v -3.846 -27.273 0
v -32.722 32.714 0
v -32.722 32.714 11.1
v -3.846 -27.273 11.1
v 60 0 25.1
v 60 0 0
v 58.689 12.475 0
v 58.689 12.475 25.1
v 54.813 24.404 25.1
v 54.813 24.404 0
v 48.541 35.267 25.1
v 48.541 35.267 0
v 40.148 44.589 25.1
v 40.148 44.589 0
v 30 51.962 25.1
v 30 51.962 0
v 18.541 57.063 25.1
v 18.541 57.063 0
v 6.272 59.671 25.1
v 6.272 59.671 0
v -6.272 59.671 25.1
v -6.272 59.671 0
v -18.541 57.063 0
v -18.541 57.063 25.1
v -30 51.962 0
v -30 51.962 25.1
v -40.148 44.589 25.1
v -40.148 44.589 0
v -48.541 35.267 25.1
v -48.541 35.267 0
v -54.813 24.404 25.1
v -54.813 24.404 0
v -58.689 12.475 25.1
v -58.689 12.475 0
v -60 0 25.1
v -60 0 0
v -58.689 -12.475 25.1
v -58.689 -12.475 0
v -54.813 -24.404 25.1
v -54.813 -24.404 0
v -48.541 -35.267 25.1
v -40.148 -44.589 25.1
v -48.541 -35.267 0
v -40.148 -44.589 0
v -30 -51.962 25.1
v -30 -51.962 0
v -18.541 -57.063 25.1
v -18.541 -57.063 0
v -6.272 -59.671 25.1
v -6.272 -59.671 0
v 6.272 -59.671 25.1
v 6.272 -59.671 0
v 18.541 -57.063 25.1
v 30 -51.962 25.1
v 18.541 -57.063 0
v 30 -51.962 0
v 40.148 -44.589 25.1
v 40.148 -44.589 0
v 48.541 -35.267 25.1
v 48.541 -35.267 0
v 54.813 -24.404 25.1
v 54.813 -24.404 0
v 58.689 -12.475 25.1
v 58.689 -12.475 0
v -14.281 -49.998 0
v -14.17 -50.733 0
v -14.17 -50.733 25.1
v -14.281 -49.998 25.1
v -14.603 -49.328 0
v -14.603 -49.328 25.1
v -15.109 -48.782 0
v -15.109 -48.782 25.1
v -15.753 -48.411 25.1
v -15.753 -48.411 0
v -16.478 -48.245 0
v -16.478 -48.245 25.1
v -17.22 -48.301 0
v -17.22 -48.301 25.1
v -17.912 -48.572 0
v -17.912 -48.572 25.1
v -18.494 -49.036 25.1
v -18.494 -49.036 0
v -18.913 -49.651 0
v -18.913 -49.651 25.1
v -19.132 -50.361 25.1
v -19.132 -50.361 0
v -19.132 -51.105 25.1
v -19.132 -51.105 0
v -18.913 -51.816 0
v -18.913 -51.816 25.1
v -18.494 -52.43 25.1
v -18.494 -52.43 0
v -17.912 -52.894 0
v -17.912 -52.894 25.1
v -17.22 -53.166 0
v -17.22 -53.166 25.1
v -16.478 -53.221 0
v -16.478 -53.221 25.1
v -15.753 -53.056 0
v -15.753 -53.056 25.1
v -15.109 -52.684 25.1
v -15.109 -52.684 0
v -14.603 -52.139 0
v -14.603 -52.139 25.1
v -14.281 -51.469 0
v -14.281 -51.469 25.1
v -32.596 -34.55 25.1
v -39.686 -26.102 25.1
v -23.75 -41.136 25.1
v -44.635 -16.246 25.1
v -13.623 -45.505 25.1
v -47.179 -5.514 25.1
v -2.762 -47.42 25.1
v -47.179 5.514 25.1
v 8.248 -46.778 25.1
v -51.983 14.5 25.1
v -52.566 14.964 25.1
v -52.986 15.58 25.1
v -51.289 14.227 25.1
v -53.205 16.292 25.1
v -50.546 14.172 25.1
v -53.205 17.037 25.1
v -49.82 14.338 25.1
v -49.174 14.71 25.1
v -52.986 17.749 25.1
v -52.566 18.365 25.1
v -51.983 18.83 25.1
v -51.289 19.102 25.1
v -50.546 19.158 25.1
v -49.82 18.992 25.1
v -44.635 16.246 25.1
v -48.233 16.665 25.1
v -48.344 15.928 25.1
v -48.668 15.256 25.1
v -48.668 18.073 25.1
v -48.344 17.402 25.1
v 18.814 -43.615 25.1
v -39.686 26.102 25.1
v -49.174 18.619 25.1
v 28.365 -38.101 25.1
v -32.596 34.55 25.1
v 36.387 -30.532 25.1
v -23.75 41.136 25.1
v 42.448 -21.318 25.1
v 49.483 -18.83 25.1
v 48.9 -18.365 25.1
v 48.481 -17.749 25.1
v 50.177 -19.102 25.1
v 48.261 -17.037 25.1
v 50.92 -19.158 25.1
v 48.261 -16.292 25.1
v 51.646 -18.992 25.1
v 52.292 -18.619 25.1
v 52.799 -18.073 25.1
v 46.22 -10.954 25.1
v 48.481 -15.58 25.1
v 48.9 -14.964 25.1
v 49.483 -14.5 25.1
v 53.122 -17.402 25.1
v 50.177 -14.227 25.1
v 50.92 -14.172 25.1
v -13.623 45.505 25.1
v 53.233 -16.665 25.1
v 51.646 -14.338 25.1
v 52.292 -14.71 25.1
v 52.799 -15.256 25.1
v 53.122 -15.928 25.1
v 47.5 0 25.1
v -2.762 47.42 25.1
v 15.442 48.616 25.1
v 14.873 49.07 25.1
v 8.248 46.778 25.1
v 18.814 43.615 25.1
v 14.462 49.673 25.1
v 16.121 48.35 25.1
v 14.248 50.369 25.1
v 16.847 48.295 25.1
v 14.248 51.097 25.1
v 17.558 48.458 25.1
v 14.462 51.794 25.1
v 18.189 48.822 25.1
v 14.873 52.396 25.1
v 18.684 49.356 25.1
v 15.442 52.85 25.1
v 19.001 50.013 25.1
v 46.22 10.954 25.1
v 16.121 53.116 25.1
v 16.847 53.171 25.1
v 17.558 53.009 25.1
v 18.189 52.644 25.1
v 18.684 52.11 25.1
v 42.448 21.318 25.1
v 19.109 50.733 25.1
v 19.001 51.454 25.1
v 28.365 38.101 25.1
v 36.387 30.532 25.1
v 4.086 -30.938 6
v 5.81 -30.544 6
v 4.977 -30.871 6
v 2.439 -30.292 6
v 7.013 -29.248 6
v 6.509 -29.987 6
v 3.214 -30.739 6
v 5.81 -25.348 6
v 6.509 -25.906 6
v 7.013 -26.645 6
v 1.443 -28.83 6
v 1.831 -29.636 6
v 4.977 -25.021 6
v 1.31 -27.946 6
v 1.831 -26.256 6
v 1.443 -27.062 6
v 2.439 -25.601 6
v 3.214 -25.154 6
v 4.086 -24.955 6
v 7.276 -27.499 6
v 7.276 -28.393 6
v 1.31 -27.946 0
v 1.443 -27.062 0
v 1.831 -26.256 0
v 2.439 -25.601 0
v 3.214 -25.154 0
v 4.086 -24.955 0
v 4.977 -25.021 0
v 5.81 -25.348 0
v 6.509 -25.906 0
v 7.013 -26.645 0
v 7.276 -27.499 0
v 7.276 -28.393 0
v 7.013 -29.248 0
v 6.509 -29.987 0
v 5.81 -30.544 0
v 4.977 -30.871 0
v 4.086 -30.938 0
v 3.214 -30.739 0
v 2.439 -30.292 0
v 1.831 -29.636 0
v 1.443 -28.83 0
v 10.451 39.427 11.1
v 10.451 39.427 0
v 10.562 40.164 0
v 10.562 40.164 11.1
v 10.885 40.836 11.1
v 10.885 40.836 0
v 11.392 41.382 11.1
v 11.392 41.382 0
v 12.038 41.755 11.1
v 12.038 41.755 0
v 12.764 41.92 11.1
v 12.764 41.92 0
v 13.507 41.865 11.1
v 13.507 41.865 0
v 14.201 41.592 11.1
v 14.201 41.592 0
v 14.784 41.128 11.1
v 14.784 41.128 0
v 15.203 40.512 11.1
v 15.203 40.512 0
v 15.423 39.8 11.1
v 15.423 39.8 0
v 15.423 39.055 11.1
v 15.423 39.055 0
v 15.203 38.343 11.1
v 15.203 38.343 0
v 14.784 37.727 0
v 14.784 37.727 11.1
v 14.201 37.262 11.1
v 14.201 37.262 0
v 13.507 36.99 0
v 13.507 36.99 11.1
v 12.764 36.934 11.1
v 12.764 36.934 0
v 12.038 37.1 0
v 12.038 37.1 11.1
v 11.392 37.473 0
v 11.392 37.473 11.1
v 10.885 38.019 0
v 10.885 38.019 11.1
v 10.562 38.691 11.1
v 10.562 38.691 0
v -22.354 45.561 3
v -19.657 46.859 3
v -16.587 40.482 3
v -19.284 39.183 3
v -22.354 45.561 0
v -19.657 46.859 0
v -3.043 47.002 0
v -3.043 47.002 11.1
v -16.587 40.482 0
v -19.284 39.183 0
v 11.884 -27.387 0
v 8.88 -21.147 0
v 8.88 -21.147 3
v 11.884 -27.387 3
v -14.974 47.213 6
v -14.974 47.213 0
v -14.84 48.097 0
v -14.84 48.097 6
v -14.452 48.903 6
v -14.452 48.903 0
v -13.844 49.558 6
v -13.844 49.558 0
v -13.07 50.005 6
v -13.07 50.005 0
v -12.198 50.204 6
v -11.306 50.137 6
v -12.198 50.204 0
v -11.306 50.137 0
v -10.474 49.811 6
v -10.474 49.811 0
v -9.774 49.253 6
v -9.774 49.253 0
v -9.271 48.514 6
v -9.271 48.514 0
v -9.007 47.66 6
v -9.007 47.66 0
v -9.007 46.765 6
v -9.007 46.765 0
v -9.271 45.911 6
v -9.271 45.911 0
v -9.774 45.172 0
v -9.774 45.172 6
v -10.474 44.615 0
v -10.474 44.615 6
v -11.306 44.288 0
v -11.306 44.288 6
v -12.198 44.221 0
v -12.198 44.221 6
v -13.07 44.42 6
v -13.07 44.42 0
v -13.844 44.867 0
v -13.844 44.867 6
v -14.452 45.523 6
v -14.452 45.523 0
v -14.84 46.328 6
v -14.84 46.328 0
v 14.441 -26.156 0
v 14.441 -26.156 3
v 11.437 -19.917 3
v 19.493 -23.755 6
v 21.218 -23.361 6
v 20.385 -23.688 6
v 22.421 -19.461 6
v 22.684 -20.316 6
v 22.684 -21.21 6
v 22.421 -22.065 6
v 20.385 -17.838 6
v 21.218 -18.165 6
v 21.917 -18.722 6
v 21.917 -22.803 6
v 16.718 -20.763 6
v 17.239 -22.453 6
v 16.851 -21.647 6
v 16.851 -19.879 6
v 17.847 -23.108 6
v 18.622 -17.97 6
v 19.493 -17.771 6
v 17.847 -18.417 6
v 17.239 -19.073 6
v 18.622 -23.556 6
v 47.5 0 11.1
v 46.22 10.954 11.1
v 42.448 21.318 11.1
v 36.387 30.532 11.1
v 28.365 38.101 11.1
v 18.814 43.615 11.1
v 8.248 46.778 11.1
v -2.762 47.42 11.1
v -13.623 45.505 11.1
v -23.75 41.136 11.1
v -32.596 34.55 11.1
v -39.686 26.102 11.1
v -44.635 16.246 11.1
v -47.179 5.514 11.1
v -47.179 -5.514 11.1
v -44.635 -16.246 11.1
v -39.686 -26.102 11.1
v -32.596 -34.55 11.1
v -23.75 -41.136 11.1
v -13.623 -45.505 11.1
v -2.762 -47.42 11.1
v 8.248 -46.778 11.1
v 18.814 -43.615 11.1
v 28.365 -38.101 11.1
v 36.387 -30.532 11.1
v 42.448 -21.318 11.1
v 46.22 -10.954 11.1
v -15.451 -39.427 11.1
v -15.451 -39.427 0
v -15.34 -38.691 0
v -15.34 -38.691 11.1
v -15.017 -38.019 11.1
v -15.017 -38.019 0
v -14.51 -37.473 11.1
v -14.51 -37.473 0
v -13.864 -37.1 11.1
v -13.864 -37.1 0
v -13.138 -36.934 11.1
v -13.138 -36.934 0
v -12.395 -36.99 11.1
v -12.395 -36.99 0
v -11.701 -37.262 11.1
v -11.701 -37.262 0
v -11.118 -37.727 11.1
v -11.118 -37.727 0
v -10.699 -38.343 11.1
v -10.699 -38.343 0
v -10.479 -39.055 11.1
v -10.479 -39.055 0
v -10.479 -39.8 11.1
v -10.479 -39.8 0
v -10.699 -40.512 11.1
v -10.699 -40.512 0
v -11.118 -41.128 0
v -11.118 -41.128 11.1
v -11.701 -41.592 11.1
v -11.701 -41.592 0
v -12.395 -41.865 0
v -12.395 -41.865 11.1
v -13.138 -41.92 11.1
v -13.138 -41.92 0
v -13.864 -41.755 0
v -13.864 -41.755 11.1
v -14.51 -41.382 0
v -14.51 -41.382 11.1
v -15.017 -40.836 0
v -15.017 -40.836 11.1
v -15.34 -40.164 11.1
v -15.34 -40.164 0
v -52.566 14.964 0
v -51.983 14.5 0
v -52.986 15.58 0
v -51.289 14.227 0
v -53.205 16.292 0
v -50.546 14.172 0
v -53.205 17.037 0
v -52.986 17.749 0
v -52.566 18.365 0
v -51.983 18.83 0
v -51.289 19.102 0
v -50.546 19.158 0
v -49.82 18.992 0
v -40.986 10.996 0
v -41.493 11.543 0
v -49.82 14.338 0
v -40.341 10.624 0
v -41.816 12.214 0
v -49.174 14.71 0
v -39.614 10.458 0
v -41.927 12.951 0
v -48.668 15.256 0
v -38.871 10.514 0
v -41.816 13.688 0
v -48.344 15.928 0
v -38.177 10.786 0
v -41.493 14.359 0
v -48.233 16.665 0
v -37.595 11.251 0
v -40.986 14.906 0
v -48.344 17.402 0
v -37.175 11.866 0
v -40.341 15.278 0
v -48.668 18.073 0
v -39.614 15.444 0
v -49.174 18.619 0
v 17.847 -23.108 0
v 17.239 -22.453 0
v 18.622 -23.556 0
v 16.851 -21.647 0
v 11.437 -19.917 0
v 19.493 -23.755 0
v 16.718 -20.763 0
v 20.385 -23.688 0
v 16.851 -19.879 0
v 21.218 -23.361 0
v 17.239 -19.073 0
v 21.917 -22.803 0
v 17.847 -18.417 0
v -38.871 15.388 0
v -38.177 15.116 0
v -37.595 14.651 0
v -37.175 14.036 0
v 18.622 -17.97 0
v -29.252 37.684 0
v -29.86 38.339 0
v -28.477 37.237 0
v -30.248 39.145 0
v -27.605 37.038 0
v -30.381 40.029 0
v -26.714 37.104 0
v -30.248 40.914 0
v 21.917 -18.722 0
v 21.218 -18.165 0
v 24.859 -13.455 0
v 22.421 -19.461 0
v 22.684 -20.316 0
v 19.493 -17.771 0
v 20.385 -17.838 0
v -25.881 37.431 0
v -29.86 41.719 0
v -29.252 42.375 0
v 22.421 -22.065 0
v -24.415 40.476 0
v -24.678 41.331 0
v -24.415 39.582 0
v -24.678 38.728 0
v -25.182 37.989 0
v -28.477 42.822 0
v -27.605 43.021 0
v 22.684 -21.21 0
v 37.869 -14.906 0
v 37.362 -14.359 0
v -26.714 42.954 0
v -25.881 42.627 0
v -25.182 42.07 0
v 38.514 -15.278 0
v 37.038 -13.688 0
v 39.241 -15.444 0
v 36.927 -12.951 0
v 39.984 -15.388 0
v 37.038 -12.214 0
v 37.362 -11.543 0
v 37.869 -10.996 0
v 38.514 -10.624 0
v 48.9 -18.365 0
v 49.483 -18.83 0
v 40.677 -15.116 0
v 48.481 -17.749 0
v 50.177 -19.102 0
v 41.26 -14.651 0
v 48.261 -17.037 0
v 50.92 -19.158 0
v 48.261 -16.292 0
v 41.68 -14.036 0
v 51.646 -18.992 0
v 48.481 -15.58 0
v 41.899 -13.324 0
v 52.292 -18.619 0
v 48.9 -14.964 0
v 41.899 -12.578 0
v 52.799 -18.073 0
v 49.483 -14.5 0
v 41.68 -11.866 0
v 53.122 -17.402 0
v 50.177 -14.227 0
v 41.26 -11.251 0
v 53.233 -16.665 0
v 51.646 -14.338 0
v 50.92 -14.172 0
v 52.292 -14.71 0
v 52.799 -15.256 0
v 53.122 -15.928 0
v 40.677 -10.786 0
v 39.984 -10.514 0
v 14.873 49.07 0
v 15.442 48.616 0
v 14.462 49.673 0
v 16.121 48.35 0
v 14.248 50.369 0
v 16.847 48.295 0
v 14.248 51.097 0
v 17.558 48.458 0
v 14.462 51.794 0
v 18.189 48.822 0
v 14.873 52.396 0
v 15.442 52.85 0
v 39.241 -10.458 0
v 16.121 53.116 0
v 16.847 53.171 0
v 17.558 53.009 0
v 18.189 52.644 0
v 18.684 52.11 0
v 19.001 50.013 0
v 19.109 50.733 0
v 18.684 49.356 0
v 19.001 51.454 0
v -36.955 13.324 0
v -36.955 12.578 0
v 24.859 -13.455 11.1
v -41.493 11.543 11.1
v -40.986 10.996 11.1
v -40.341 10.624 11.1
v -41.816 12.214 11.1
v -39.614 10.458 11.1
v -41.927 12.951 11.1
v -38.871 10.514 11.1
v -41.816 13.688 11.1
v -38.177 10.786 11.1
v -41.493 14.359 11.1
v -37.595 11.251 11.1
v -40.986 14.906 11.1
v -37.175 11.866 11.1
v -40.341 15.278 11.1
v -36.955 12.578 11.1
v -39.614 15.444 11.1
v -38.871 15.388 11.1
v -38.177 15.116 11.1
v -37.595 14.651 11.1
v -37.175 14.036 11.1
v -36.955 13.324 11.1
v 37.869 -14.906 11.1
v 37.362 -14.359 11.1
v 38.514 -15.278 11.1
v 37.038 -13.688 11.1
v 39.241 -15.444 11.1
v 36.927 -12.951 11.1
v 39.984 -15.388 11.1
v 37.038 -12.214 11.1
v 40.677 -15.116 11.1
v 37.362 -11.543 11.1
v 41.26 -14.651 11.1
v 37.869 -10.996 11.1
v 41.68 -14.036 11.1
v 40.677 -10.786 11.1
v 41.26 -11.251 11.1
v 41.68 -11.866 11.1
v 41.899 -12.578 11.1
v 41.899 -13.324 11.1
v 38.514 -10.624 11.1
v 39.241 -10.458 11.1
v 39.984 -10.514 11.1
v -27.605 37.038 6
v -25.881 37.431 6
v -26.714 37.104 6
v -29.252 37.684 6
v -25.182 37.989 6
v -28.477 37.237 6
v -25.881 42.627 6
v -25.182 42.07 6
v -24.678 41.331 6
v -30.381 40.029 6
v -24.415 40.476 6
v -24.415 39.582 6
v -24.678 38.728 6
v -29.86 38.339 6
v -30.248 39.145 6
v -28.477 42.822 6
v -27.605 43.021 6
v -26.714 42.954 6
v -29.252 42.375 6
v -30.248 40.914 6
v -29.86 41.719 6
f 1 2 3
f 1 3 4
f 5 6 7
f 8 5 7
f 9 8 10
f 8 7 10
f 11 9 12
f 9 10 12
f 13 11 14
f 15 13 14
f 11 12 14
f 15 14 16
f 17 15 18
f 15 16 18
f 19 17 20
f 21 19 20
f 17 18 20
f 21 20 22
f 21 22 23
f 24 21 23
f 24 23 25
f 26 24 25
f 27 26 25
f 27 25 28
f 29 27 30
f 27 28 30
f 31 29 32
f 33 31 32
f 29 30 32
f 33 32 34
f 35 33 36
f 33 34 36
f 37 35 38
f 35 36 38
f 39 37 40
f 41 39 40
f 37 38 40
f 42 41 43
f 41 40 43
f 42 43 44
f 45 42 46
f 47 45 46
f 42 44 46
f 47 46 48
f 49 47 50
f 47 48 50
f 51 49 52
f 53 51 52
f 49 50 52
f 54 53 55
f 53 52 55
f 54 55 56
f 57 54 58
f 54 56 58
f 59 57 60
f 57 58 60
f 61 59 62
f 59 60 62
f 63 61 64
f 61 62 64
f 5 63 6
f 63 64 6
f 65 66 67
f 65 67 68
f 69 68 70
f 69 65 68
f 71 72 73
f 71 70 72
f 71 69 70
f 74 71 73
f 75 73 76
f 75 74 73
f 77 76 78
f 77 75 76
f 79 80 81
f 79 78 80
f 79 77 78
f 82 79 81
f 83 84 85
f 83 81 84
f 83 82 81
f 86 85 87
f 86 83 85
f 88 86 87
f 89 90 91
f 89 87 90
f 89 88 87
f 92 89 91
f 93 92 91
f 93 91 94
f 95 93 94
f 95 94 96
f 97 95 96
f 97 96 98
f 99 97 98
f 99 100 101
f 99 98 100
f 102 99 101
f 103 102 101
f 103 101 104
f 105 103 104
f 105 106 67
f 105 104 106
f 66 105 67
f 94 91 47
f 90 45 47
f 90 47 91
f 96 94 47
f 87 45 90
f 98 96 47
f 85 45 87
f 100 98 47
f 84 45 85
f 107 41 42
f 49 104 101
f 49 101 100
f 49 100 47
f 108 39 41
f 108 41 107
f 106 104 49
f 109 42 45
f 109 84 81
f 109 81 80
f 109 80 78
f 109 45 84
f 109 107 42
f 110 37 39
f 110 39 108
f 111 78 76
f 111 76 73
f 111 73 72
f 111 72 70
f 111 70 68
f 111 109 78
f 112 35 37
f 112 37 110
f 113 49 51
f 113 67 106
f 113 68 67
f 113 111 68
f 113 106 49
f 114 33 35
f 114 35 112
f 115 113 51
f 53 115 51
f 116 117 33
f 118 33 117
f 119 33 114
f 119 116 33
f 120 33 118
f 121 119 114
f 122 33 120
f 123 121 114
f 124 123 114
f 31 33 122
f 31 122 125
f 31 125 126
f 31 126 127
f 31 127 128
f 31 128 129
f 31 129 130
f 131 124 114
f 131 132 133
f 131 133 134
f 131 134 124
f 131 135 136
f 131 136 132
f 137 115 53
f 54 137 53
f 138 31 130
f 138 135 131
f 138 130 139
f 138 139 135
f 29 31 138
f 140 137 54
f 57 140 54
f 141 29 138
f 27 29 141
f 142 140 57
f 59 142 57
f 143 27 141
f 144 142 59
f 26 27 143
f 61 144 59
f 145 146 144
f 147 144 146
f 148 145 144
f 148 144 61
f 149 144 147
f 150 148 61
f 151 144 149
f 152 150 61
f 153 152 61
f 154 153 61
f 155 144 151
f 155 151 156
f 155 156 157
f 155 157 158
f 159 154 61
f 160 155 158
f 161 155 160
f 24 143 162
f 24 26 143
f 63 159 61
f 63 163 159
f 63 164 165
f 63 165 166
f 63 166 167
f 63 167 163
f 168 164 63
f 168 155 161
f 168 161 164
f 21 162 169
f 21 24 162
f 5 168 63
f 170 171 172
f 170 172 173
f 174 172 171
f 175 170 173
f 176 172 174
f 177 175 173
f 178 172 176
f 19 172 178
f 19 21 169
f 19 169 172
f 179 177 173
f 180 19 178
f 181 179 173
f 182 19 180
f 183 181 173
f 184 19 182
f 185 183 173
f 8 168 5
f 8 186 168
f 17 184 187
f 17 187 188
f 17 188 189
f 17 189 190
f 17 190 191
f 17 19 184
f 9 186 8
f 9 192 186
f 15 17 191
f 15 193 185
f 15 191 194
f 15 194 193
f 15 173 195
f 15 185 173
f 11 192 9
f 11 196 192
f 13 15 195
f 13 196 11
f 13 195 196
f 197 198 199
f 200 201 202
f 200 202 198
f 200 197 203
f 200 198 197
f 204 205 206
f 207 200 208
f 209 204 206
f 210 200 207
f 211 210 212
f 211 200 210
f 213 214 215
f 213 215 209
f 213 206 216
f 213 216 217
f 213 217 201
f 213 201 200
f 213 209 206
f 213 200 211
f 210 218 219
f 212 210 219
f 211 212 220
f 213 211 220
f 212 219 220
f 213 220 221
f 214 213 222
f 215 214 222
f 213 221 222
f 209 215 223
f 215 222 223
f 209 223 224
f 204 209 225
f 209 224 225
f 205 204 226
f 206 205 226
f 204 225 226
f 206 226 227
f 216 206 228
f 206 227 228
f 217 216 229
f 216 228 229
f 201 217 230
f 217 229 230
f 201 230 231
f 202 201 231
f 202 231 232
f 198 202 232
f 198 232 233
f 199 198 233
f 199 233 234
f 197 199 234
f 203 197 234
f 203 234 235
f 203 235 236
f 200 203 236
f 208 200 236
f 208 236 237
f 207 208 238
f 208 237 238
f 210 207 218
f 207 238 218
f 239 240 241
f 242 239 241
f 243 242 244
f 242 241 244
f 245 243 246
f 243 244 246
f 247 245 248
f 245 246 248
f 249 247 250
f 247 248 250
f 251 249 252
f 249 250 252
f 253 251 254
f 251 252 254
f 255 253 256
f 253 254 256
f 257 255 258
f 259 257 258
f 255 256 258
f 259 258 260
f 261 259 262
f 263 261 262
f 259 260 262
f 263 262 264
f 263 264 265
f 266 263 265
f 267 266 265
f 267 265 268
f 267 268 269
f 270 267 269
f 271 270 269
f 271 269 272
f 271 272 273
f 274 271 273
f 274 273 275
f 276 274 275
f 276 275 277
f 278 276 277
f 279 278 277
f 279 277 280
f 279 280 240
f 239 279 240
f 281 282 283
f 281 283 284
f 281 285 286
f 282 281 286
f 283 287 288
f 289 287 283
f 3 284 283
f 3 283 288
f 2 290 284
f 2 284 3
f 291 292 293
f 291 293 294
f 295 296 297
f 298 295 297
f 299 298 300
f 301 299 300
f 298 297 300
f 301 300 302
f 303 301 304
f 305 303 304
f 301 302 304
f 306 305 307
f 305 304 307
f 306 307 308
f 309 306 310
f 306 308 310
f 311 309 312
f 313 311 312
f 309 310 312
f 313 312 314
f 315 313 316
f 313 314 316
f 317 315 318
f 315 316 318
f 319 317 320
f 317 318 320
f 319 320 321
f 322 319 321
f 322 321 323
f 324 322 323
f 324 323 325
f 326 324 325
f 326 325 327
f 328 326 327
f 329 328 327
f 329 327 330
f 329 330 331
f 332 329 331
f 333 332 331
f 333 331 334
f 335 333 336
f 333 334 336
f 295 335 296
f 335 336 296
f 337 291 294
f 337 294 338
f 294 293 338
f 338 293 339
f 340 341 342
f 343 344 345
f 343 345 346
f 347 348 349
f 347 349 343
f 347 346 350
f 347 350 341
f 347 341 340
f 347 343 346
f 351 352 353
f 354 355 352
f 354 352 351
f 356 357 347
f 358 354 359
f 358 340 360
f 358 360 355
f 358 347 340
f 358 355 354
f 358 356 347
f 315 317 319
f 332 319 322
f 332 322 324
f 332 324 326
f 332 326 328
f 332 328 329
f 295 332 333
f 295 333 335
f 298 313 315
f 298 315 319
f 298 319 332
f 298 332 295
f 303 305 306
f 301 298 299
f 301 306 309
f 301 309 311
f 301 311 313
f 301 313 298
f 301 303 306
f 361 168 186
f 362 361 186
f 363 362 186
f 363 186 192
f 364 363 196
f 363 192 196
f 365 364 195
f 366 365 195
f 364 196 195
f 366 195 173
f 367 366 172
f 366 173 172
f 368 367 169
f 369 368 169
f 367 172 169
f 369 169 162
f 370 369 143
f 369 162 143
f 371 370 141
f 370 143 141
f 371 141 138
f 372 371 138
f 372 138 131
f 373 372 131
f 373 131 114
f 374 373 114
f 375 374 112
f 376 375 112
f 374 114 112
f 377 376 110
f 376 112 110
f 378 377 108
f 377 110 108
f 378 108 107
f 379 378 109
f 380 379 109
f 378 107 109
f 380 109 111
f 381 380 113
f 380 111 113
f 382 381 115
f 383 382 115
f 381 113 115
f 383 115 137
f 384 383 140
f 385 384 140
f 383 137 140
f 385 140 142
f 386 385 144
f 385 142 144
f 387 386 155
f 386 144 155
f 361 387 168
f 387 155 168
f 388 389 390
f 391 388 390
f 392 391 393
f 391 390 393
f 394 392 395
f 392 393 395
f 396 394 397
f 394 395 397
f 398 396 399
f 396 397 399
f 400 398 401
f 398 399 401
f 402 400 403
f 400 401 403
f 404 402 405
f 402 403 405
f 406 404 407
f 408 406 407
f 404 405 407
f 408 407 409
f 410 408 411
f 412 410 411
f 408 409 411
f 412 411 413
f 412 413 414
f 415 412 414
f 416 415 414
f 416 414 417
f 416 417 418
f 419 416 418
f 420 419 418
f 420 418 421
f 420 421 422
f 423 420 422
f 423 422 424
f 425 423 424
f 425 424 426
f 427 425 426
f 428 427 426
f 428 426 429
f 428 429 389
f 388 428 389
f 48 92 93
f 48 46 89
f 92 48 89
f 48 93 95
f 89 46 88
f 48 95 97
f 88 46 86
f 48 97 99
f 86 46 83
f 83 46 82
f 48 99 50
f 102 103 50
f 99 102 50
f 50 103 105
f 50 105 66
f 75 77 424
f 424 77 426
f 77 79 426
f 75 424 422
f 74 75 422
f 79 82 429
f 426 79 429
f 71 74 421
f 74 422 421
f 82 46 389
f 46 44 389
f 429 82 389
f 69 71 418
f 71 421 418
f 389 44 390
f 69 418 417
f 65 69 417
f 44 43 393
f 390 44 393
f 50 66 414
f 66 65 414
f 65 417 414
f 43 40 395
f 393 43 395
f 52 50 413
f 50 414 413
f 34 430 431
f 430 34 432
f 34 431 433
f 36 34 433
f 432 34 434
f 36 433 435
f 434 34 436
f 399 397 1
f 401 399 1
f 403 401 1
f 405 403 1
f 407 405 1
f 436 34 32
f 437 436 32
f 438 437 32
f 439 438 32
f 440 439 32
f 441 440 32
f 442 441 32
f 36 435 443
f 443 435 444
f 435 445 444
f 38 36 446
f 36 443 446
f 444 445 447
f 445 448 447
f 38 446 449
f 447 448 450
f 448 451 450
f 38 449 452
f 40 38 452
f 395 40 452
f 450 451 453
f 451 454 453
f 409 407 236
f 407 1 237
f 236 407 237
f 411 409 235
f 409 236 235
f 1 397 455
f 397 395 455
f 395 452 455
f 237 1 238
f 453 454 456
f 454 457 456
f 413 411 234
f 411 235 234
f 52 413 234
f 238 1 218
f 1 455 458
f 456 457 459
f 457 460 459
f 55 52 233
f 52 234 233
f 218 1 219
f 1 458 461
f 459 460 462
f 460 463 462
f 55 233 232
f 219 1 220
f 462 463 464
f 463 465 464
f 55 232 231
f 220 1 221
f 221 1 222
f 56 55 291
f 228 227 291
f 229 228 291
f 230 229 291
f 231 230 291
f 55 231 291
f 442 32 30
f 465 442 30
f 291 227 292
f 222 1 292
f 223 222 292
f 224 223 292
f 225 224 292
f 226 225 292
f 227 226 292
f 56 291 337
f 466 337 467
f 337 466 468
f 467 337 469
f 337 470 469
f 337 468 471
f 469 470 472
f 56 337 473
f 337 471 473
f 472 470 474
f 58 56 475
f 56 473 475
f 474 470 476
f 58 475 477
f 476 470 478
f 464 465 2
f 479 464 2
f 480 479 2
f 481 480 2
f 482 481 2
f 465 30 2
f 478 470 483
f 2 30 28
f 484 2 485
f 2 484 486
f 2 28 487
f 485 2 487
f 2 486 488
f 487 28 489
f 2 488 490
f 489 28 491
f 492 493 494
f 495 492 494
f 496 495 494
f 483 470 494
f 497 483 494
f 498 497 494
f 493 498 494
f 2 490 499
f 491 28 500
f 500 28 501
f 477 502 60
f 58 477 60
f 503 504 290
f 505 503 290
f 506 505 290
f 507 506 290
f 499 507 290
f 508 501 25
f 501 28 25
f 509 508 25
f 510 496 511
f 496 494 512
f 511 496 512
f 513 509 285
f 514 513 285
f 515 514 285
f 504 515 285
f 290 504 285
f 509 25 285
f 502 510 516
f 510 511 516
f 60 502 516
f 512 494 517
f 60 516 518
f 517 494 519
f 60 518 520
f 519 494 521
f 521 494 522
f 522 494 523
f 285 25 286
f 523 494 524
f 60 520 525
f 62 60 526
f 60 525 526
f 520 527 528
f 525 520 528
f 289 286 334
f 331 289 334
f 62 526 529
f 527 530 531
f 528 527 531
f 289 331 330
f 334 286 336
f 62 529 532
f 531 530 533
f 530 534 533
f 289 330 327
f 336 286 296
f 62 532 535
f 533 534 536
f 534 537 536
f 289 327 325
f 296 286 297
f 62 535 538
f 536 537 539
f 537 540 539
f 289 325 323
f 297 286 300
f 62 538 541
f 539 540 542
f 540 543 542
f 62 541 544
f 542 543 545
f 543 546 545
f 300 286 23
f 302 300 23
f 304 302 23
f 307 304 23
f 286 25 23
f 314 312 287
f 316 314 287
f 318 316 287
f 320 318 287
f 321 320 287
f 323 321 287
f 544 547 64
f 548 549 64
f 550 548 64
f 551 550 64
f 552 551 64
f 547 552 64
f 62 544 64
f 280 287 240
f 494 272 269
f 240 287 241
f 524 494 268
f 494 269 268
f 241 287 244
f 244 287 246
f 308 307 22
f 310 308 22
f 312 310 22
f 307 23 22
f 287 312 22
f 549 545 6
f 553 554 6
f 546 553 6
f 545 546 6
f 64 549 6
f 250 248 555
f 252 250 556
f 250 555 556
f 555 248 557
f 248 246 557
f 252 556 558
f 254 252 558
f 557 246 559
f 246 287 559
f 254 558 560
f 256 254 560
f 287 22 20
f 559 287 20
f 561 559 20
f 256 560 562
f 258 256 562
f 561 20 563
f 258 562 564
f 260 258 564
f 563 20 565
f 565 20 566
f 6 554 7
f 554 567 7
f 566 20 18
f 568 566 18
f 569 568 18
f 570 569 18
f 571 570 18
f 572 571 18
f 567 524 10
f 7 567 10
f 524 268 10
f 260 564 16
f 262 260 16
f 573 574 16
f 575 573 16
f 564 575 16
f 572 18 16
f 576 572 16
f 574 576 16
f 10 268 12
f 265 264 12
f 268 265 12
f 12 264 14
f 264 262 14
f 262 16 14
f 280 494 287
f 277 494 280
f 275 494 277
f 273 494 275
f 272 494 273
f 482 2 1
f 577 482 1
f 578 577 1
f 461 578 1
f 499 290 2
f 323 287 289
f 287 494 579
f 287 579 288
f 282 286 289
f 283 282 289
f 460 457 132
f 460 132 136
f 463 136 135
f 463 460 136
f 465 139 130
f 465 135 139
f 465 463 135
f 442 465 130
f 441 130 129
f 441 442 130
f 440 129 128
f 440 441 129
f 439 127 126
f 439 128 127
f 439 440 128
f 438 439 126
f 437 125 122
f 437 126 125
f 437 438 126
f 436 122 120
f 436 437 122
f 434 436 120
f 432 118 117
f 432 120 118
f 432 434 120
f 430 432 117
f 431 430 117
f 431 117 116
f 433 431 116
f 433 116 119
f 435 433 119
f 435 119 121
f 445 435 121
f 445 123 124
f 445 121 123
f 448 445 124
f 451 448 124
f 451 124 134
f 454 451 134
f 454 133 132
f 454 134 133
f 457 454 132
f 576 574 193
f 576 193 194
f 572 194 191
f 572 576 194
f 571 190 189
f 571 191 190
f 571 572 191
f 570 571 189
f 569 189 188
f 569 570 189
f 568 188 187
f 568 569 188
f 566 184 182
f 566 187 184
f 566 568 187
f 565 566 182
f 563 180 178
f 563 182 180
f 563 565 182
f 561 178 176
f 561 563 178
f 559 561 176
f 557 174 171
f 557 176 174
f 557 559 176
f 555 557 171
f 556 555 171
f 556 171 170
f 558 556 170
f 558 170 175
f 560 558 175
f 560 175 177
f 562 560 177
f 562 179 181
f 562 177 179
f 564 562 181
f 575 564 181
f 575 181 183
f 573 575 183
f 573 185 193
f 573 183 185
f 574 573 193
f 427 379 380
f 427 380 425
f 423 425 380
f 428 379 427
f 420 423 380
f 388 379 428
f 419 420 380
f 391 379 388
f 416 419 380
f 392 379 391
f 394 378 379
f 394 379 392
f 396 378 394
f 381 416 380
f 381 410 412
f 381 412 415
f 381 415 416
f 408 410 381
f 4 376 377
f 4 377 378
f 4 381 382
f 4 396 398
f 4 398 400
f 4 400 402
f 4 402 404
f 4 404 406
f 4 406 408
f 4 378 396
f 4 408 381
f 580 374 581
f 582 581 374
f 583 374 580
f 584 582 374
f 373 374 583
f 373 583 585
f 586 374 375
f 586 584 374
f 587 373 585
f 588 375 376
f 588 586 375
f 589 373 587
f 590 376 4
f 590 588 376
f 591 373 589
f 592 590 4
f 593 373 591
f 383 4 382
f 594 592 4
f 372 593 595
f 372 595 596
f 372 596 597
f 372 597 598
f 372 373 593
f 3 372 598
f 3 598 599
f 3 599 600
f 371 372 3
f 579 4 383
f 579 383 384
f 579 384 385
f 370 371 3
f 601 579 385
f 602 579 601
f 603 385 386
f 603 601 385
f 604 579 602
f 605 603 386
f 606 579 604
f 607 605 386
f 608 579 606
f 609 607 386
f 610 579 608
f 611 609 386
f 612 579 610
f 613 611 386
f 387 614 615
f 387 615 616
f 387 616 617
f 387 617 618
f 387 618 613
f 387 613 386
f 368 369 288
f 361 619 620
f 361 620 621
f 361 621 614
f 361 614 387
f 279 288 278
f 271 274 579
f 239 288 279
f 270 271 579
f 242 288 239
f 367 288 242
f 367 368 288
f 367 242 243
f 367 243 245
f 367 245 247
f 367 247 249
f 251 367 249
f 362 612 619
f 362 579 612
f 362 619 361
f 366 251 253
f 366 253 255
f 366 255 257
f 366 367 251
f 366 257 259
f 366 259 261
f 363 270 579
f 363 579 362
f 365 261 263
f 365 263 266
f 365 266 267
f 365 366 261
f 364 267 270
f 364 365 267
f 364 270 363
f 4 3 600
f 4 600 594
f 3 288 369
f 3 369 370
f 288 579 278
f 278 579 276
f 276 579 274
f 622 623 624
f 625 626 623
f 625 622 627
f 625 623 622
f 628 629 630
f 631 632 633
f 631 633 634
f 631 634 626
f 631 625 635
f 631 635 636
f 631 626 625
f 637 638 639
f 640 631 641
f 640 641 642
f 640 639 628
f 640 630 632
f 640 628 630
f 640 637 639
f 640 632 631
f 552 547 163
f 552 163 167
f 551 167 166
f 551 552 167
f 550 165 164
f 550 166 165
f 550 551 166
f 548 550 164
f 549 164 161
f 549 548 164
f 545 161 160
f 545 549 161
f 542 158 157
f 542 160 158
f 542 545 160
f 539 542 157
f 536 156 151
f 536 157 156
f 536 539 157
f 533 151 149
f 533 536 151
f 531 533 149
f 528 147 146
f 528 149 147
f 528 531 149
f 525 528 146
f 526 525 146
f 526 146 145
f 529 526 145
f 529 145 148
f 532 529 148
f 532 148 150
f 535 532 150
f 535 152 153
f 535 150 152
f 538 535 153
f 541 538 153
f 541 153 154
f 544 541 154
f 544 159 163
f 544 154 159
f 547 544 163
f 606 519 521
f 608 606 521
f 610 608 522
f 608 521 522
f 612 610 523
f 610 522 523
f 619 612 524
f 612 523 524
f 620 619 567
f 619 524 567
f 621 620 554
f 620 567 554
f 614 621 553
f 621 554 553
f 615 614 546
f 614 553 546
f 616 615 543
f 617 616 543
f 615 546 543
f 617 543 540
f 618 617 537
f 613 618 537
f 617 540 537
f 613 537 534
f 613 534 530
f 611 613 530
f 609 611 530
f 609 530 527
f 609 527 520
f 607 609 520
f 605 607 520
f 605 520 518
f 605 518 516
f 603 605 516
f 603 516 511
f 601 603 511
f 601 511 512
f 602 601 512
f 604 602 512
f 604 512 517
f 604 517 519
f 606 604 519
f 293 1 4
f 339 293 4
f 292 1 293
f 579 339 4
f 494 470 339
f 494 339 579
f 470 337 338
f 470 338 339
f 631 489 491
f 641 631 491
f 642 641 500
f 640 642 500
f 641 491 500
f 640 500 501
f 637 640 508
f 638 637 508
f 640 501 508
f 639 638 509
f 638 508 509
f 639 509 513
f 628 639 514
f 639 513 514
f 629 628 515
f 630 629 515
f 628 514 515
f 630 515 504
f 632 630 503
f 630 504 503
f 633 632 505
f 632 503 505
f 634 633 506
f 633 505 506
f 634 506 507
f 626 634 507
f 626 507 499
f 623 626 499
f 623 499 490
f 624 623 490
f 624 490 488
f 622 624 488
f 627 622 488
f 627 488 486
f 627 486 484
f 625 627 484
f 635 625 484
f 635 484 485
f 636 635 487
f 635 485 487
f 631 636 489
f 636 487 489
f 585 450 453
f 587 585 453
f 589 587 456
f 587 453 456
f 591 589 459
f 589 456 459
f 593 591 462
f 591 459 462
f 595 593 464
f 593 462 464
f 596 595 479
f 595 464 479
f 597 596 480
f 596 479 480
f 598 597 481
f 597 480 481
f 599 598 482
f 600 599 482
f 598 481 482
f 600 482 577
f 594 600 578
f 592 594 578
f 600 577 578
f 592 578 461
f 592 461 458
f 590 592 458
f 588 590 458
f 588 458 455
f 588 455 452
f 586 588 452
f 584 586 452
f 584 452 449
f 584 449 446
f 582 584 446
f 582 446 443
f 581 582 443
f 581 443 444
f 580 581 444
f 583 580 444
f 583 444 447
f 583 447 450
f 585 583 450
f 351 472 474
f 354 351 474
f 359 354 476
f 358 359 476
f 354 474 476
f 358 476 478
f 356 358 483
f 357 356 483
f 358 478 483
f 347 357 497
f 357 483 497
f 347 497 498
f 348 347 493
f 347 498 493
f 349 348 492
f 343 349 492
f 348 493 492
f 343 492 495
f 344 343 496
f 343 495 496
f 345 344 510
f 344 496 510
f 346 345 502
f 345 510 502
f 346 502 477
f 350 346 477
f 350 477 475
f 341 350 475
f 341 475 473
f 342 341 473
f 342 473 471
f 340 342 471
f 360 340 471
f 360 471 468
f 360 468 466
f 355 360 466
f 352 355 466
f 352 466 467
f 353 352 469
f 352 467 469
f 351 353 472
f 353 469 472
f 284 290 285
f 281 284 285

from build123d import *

# Parameters (mm, degrees)
SKETCH1_R               = 60
BOSS_EXTRUDE1_DEPTH     = 25.1
SKETCH3_R               = 47.5
CUT_EXTRUDE2_DEPTH      = 14
CUT_EXTRUDE5_DEPTH      = 89.487343728
CUT_EXTRUDE5_DEPTH_BACK = 89.487343728
SKETCH2_R               = 2.494998654
SKETCH2_R_2             = 2.5
SKETCH2_R_3             = 2.444443829
SKETCH6_R               = 3
CUT_EXTRUDE6_DEPTH      = 6
CUT_EXTRUDE7_DEPTH      = 87
CUT_EXTRUDE7_DEPTH_BACK = 87
SKETCH8_R               = 2.5
CUT_EXTRUDE8_DEPTH      = 81
CUT_EXTRUDE9_DEPTH      = 3


with BuildPart() as part:
    # Sketch1 → Boss-Extrude1 (new body)
    with BuildSketch(Plane.XY):
        Circle(SKETCH1_R)
    extrude(amount=BOSS_EXTRUDE1_DEPTH)

    # Sketch3 → Cut-Extrude2 (cut)
    with BuildSketch(Plane.XY.offset(25.1)):
        Circle(SKETCH3_R)
    extrude(amount=-CUT_EXTRUDE2_DEPTH, mode=Mode.SUBTRACT)

    # Sketch2 → Cut-Extrude5 (cut, two sides: drawn at the far end of the back side and taken through both)
    with BuildSketch(Plane.XY.offset(25.1).offset(-CUT_EXTRUDE5_DEPTH_BACK)):
        with Locations((-16.664697145, -50.733104448)):
            Circle(SKETCH2_R)
        with Locations((-50.733105114, 16.664696544)):
            Circle(SKETCH2_R_2)
        with Locations((16.664695878, 50.733104512)):
            Circle(SKETCH2_R_3)
        with Locations((50.733103846, -16.66469648)):
            Circle(SKETCH2_R_2)
    extrude(amount=CUT_EXTRUDE5_DEPTH + CUT_EXTRUDE5_DEPTH_BACK, mode=Mode.SUBTRACT)

    # Sketch6 → Cut-Extrude6 (cut)
    with BuildSketch(Plane(origin=(0, 0, 0), x_dir=(-1, 0, 0), z_dir=(0, 0, -1))):
        with Locations((11.973502988, 47.212610548)):
            Circle(SKETCH6_R)
        with Locations((27.381285989, 40.029281029)):
            Circle(SKETCH6_R)
        with Locations((-19.717656658, -20.762902692)):
            Circle(SKETCH6_R)
        with Locations((-4.309873657, -27.946232212)):
            Circle(SKETCH6_R)
    extrude(amount=-CUT_EXTRUDE6_DEPTH, mode=Mode.SUBTRACT)

    # Sketch7 → Cut-Extrude7 (cut, two sides: drawn at the far end of the back side and taken through both)
    with BuildSketch(Plane.XY.offset(11.1).offset(-CUT_EXTRUDE7_DEPTH_BACK)):
        Polygon((-32.722381774, 32.714358343), (-3.845549598, -27.273283804), (24.859322702, -13.455341469), (-3.0425496, 47.001626555), align=None)
    extrude(amount=CUT_EXTRUDE7_DEPTH + CUT_EXTRUDE7_DEPTH_BACK, mode=Mode.SUBTRACT)

    # Sketch8 → Cut-Extrude8 (cut)
    with BuildSketch(Plane(origin=(0, 0, 0), x_dir=(-1, 0, 0), z_dir=(0, 0, -1))):
        with Locations((-39.427412605, -12.951028347)):
            Circle(SKETCH8_R)
        with Locations((-12.951028347, 39.427412605)):
            Circle(SKETCH8_R)
        with Locations((39.427412605, 12.951028347)):
            Circle(SKETCH8_R)
        with Locations((12.951028347, -39.427412605)):
            Circle(SKETCH8_R)
    extrude(amount=-CUT_EXTRUDE8_DEPTH, mode=Mode.SUBTRACT)

    # Sketch9 → Cut-Extrude9 (cut)
    with BuildSketch(Plane(origin=(0, 0, 0), x_dir=(-1, 0, 0), z_dir=(0, 0, -1))):
        Polygon((-8.880375106, -21.147282201), (-11.884100541, -27.387108141), (-14.440828659, -26.156351169), (-11.437103225, -19.916525229), align=None)
        Polygon((19.284340571, 39.183158361), (22.354381036, 45.560744644), (19.657241196, 46.859092966), (16.587200731, 40.481506683), align=None)
    extrude(amount=-CUT_EXTRUDE9_DEPTH, mode=Mode.SUBTRACT)


solid = part.part
